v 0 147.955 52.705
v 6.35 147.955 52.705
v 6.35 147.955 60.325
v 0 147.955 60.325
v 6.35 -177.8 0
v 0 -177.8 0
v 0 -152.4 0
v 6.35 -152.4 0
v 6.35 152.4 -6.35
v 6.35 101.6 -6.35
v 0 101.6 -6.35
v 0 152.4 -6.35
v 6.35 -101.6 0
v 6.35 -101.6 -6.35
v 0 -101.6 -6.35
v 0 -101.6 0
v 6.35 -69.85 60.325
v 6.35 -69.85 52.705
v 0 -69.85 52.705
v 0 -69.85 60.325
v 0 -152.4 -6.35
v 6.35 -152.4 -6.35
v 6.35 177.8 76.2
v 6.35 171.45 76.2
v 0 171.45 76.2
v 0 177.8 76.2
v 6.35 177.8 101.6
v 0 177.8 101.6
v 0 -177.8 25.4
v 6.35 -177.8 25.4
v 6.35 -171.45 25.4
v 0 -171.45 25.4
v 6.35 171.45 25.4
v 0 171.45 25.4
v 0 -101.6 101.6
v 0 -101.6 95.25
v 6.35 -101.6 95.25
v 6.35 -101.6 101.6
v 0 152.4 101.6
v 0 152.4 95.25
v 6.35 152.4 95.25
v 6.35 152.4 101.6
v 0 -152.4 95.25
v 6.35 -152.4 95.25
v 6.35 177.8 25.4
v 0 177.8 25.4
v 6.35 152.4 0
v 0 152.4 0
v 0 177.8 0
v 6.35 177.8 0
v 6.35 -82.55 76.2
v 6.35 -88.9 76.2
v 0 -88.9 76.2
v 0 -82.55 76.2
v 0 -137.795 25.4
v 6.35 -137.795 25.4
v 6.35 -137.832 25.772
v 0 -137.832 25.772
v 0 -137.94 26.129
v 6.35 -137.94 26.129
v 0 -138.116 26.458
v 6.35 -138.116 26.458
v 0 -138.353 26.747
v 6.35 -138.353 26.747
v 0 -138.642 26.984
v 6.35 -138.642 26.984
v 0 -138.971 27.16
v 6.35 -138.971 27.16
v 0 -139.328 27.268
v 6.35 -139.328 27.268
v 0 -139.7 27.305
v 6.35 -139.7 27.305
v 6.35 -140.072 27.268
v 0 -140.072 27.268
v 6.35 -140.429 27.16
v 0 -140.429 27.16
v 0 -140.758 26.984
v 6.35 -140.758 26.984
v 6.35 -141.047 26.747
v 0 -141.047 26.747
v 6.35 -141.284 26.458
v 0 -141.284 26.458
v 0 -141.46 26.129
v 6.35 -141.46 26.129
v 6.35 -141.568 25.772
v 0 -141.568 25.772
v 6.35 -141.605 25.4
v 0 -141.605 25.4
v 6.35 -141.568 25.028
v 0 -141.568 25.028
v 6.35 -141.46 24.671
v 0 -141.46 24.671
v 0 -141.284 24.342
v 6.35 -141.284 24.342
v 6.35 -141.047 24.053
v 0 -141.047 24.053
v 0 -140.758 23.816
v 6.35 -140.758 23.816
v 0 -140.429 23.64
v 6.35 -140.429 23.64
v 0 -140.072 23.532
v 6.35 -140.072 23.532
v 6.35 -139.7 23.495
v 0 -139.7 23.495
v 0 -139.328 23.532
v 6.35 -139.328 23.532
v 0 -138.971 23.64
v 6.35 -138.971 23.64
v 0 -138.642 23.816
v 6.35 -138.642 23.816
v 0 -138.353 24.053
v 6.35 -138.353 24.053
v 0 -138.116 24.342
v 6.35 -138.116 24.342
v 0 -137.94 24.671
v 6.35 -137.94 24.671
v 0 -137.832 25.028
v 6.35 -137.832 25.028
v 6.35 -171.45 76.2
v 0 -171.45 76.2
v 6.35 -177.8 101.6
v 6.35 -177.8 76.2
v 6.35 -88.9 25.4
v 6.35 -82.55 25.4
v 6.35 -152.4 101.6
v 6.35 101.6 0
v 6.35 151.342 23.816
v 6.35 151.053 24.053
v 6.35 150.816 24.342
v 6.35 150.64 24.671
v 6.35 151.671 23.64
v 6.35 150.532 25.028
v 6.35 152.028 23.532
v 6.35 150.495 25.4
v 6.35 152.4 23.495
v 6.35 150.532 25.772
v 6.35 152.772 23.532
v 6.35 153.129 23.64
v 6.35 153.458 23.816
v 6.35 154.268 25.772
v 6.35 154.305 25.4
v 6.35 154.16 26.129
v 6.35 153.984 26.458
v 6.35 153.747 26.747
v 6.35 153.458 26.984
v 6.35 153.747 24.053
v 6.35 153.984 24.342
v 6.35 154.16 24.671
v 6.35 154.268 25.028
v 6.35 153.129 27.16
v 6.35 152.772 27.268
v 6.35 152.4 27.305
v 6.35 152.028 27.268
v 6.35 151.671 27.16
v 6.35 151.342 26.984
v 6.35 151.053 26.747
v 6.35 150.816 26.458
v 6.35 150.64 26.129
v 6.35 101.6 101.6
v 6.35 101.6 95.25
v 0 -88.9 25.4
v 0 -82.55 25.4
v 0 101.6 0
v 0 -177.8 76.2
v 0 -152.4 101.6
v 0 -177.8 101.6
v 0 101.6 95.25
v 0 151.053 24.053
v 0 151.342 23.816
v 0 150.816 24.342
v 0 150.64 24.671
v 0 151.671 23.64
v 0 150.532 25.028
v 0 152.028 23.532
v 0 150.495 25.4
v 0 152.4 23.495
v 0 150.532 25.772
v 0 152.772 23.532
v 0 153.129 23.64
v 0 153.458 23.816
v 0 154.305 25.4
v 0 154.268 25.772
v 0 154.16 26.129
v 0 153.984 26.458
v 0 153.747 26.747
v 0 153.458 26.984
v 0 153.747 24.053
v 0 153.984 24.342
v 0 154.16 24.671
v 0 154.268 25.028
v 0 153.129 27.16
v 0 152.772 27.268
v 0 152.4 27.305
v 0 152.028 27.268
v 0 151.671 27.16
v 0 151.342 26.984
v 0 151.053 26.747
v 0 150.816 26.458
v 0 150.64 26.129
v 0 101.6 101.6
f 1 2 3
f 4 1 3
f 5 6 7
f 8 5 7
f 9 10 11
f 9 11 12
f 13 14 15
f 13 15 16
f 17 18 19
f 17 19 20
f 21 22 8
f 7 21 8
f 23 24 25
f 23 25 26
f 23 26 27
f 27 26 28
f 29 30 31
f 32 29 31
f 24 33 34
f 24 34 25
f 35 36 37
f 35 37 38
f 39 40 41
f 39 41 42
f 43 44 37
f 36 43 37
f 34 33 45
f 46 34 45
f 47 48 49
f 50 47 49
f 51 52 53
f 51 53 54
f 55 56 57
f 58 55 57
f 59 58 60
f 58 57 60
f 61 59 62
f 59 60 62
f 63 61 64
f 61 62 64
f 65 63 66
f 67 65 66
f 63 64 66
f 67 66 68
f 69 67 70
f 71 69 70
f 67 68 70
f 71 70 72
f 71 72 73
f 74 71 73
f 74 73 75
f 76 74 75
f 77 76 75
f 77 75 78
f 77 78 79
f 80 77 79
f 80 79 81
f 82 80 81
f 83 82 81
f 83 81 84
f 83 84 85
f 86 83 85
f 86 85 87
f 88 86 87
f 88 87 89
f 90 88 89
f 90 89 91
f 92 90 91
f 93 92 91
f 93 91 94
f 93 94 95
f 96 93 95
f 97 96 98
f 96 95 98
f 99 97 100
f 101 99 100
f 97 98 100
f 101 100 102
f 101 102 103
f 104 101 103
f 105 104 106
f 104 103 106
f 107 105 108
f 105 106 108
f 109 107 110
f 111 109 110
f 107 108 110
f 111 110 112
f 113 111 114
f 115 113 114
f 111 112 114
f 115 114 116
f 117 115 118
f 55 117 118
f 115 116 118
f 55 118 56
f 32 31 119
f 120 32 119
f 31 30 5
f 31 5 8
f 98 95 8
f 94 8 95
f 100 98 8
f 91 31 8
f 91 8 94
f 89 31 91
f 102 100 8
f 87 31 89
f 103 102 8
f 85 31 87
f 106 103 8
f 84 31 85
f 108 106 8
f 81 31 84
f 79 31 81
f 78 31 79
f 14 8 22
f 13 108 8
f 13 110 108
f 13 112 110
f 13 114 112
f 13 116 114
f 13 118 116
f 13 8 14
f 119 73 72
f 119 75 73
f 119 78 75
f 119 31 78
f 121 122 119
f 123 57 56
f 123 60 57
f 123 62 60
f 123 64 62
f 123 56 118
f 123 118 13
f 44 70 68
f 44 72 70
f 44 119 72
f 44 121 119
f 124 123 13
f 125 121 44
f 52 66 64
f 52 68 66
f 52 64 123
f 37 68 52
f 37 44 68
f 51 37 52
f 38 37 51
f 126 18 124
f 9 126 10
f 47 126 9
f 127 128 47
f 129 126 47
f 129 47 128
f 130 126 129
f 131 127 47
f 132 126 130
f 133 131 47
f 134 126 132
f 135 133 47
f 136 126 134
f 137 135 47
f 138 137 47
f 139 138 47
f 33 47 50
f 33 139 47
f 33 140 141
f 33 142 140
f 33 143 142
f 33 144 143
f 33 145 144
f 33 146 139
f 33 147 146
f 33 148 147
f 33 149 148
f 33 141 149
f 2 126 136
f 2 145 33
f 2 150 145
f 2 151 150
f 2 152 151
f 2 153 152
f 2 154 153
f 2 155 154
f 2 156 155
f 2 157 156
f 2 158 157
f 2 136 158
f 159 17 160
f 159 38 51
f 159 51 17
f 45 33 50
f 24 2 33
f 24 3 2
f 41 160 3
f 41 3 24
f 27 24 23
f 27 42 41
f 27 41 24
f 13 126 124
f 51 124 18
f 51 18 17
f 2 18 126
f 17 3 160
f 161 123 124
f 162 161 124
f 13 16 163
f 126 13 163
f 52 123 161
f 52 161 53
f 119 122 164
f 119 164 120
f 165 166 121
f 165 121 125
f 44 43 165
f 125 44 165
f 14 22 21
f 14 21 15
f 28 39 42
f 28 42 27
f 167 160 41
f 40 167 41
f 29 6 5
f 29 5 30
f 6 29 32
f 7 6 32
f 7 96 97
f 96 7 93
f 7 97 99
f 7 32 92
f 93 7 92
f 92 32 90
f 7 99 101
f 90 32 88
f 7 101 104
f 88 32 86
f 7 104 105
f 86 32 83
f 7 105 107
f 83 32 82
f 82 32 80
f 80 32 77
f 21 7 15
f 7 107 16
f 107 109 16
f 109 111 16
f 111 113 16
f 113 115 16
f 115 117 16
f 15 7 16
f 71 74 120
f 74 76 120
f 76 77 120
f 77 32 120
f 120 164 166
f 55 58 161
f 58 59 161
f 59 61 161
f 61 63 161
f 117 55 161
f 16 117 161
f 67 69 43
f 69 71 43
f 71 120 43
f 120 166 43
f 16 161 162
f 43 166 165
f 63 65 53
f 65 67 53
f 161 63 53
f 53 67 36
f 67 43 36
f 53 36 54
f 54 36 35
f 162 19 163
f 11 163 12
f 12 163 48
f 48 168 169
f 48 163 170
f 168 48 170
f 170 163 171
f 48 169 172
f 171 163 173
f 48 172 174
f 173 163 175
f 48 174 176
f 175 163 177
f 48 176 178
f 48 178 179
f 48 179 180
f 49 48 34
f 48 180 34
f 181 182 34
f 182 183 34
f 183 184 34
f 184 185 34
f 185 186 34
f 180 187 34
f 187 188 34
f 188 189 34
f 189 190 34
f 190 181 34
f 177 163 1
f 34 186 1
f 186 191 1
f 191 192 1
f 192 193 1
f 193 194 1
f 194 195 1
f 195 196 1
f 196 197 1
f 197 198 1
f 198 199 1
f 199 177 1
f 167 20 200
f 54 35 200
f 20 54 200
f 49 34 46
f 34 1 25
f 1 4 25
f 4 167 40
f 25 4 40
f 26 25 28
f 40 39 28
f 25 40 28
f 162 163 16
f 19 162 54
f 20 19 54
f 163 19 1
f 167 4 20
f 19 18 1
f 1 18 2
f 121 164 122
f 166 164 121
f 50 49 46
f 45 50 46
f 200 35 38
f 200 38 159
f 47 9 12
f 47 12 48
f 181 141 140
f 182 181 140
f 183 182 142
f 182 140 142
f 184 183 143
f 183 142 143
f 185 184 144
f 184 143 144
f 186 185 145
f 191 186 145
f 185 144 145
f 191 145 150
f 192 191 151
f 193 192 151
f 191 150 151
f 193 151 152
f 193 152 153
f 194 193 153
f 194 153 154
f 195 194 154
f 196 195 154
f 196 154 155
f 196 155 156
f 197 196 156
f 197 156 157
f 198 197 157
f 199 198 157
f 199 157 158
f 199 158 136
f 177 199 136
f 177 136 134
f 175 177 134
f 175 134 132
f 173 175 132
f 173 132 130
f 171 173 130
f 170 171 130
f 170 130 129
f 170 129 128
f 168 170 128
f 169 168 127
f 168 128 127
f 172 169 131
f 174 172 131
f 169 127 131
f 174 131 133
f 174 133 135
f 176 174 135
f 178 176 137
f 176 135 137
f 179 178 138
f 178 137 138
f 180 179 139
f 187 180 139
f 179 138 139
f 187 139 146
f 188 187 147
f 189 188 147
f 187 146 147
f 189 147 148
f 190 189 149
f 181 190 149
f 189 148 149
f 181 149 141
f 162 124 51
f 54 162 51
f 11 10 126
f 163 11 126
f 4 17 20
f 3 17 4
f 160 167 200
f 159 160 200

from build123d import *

# Parameters (mm, degrees)
F0_W      = 355.6
F0_H      = 101.6
F1_DEPTH  = 6.35
F2_W      = 50.8
F2_H      = 6.35
F3_DEPTH  = 6.35
F4_R      = 1.905
F5_DEPTH  = 6.351
F6_W      = 6.35
F6_H      = 50.8
F7_DEPTH  = 25.4
F9_W      = 6.35
F9_H      = 50.8
F10_DEPTH = 25.4
F11_W     = 50.8
F11_H     = 6.35
F12_DEPTH = 25.4
F13_W     = 217.805
F13_H     = 7.62
F14_DEPTH = 25.4


with BuildPart() as f1:
    # F0 (on Right) → F1 (new body)
    with BuildSketch(Plane.YZ):
        with Locations((0, 50.8)):
            Rectangle(F0_W, F0_H)
    extrude(amount=F1_DEPTH)

    # F4 (on face) → F5 (cut, through all)
    with BuildSketch(Plane.YZ.offset(6.35)):
        with Locations((152.4, 25.4)):
            Circle(F4_R)
        with Locations((-139.7, 25.4)):
            Circle(F4_R)
    extrude(amount=-F5_DEPTH, mode=Mode.SUBTRACT)

    # F6 (on face) → F7 (cut)
    with BuildSketch(Plane.YZ.offset(6.35)):
        with Locations((174.625, 50.8)):
            Rectangle(F6_W, F6_H)
        with Locations((-174.625, 50.8)):
            Rectangle(F6_W, F6_H)
    extrude(amount=-F7_DEPTH, mode=Mode.SUBTRACT)


with BuildPart() as f3:
    # F2 (on face) → F3 (new body)
    with BuildSketch(Plane.YZ.offset(6.35)):
        with Locations((127, -3.175)):
            Rectangle(F2_W, F2_H)
        with Locations((-127, -3.175)):
            Rectangle(F2_W, F2_H)
    extrude(amount=-F3_DEPTH)

    # F8: union F1
    add(f1.part)

    # F9 (on face) → F10 (cut)
    with BuildSketch(Plane.YZ.offset(6.35)):
        with Locations((-85.725, 50.8)):
            Rectangle(F9_W, F9_H)
    extrude(amount=-F10_DEPTH, mode=Mode.SUBTRACT)

    # F11 (on face) → F12 (cut)
    with BuildSketch(Plane.YZ.offset(6.35)):
        with Locations((-127, 98.425)):
            Rectangle(F11_W, F11_H)
        with Locations((127, 98.425)):
            Rectangle(F11_W, F11_H)
    extrude(amount=-F12_DEPTH, mode=Mode.SUBTRACT)

    # F13 (on face) → F14 (cut)
    with BuildSketch(Plane.YZ.offset(6.35)):
        with Locations((39.0525, 56.515)):
            Rectangle(F13_W, F13_H)
    extrude(amount=-F14_DEPTH, mode=Mode.SUBTRACT)


solid = f3.part
